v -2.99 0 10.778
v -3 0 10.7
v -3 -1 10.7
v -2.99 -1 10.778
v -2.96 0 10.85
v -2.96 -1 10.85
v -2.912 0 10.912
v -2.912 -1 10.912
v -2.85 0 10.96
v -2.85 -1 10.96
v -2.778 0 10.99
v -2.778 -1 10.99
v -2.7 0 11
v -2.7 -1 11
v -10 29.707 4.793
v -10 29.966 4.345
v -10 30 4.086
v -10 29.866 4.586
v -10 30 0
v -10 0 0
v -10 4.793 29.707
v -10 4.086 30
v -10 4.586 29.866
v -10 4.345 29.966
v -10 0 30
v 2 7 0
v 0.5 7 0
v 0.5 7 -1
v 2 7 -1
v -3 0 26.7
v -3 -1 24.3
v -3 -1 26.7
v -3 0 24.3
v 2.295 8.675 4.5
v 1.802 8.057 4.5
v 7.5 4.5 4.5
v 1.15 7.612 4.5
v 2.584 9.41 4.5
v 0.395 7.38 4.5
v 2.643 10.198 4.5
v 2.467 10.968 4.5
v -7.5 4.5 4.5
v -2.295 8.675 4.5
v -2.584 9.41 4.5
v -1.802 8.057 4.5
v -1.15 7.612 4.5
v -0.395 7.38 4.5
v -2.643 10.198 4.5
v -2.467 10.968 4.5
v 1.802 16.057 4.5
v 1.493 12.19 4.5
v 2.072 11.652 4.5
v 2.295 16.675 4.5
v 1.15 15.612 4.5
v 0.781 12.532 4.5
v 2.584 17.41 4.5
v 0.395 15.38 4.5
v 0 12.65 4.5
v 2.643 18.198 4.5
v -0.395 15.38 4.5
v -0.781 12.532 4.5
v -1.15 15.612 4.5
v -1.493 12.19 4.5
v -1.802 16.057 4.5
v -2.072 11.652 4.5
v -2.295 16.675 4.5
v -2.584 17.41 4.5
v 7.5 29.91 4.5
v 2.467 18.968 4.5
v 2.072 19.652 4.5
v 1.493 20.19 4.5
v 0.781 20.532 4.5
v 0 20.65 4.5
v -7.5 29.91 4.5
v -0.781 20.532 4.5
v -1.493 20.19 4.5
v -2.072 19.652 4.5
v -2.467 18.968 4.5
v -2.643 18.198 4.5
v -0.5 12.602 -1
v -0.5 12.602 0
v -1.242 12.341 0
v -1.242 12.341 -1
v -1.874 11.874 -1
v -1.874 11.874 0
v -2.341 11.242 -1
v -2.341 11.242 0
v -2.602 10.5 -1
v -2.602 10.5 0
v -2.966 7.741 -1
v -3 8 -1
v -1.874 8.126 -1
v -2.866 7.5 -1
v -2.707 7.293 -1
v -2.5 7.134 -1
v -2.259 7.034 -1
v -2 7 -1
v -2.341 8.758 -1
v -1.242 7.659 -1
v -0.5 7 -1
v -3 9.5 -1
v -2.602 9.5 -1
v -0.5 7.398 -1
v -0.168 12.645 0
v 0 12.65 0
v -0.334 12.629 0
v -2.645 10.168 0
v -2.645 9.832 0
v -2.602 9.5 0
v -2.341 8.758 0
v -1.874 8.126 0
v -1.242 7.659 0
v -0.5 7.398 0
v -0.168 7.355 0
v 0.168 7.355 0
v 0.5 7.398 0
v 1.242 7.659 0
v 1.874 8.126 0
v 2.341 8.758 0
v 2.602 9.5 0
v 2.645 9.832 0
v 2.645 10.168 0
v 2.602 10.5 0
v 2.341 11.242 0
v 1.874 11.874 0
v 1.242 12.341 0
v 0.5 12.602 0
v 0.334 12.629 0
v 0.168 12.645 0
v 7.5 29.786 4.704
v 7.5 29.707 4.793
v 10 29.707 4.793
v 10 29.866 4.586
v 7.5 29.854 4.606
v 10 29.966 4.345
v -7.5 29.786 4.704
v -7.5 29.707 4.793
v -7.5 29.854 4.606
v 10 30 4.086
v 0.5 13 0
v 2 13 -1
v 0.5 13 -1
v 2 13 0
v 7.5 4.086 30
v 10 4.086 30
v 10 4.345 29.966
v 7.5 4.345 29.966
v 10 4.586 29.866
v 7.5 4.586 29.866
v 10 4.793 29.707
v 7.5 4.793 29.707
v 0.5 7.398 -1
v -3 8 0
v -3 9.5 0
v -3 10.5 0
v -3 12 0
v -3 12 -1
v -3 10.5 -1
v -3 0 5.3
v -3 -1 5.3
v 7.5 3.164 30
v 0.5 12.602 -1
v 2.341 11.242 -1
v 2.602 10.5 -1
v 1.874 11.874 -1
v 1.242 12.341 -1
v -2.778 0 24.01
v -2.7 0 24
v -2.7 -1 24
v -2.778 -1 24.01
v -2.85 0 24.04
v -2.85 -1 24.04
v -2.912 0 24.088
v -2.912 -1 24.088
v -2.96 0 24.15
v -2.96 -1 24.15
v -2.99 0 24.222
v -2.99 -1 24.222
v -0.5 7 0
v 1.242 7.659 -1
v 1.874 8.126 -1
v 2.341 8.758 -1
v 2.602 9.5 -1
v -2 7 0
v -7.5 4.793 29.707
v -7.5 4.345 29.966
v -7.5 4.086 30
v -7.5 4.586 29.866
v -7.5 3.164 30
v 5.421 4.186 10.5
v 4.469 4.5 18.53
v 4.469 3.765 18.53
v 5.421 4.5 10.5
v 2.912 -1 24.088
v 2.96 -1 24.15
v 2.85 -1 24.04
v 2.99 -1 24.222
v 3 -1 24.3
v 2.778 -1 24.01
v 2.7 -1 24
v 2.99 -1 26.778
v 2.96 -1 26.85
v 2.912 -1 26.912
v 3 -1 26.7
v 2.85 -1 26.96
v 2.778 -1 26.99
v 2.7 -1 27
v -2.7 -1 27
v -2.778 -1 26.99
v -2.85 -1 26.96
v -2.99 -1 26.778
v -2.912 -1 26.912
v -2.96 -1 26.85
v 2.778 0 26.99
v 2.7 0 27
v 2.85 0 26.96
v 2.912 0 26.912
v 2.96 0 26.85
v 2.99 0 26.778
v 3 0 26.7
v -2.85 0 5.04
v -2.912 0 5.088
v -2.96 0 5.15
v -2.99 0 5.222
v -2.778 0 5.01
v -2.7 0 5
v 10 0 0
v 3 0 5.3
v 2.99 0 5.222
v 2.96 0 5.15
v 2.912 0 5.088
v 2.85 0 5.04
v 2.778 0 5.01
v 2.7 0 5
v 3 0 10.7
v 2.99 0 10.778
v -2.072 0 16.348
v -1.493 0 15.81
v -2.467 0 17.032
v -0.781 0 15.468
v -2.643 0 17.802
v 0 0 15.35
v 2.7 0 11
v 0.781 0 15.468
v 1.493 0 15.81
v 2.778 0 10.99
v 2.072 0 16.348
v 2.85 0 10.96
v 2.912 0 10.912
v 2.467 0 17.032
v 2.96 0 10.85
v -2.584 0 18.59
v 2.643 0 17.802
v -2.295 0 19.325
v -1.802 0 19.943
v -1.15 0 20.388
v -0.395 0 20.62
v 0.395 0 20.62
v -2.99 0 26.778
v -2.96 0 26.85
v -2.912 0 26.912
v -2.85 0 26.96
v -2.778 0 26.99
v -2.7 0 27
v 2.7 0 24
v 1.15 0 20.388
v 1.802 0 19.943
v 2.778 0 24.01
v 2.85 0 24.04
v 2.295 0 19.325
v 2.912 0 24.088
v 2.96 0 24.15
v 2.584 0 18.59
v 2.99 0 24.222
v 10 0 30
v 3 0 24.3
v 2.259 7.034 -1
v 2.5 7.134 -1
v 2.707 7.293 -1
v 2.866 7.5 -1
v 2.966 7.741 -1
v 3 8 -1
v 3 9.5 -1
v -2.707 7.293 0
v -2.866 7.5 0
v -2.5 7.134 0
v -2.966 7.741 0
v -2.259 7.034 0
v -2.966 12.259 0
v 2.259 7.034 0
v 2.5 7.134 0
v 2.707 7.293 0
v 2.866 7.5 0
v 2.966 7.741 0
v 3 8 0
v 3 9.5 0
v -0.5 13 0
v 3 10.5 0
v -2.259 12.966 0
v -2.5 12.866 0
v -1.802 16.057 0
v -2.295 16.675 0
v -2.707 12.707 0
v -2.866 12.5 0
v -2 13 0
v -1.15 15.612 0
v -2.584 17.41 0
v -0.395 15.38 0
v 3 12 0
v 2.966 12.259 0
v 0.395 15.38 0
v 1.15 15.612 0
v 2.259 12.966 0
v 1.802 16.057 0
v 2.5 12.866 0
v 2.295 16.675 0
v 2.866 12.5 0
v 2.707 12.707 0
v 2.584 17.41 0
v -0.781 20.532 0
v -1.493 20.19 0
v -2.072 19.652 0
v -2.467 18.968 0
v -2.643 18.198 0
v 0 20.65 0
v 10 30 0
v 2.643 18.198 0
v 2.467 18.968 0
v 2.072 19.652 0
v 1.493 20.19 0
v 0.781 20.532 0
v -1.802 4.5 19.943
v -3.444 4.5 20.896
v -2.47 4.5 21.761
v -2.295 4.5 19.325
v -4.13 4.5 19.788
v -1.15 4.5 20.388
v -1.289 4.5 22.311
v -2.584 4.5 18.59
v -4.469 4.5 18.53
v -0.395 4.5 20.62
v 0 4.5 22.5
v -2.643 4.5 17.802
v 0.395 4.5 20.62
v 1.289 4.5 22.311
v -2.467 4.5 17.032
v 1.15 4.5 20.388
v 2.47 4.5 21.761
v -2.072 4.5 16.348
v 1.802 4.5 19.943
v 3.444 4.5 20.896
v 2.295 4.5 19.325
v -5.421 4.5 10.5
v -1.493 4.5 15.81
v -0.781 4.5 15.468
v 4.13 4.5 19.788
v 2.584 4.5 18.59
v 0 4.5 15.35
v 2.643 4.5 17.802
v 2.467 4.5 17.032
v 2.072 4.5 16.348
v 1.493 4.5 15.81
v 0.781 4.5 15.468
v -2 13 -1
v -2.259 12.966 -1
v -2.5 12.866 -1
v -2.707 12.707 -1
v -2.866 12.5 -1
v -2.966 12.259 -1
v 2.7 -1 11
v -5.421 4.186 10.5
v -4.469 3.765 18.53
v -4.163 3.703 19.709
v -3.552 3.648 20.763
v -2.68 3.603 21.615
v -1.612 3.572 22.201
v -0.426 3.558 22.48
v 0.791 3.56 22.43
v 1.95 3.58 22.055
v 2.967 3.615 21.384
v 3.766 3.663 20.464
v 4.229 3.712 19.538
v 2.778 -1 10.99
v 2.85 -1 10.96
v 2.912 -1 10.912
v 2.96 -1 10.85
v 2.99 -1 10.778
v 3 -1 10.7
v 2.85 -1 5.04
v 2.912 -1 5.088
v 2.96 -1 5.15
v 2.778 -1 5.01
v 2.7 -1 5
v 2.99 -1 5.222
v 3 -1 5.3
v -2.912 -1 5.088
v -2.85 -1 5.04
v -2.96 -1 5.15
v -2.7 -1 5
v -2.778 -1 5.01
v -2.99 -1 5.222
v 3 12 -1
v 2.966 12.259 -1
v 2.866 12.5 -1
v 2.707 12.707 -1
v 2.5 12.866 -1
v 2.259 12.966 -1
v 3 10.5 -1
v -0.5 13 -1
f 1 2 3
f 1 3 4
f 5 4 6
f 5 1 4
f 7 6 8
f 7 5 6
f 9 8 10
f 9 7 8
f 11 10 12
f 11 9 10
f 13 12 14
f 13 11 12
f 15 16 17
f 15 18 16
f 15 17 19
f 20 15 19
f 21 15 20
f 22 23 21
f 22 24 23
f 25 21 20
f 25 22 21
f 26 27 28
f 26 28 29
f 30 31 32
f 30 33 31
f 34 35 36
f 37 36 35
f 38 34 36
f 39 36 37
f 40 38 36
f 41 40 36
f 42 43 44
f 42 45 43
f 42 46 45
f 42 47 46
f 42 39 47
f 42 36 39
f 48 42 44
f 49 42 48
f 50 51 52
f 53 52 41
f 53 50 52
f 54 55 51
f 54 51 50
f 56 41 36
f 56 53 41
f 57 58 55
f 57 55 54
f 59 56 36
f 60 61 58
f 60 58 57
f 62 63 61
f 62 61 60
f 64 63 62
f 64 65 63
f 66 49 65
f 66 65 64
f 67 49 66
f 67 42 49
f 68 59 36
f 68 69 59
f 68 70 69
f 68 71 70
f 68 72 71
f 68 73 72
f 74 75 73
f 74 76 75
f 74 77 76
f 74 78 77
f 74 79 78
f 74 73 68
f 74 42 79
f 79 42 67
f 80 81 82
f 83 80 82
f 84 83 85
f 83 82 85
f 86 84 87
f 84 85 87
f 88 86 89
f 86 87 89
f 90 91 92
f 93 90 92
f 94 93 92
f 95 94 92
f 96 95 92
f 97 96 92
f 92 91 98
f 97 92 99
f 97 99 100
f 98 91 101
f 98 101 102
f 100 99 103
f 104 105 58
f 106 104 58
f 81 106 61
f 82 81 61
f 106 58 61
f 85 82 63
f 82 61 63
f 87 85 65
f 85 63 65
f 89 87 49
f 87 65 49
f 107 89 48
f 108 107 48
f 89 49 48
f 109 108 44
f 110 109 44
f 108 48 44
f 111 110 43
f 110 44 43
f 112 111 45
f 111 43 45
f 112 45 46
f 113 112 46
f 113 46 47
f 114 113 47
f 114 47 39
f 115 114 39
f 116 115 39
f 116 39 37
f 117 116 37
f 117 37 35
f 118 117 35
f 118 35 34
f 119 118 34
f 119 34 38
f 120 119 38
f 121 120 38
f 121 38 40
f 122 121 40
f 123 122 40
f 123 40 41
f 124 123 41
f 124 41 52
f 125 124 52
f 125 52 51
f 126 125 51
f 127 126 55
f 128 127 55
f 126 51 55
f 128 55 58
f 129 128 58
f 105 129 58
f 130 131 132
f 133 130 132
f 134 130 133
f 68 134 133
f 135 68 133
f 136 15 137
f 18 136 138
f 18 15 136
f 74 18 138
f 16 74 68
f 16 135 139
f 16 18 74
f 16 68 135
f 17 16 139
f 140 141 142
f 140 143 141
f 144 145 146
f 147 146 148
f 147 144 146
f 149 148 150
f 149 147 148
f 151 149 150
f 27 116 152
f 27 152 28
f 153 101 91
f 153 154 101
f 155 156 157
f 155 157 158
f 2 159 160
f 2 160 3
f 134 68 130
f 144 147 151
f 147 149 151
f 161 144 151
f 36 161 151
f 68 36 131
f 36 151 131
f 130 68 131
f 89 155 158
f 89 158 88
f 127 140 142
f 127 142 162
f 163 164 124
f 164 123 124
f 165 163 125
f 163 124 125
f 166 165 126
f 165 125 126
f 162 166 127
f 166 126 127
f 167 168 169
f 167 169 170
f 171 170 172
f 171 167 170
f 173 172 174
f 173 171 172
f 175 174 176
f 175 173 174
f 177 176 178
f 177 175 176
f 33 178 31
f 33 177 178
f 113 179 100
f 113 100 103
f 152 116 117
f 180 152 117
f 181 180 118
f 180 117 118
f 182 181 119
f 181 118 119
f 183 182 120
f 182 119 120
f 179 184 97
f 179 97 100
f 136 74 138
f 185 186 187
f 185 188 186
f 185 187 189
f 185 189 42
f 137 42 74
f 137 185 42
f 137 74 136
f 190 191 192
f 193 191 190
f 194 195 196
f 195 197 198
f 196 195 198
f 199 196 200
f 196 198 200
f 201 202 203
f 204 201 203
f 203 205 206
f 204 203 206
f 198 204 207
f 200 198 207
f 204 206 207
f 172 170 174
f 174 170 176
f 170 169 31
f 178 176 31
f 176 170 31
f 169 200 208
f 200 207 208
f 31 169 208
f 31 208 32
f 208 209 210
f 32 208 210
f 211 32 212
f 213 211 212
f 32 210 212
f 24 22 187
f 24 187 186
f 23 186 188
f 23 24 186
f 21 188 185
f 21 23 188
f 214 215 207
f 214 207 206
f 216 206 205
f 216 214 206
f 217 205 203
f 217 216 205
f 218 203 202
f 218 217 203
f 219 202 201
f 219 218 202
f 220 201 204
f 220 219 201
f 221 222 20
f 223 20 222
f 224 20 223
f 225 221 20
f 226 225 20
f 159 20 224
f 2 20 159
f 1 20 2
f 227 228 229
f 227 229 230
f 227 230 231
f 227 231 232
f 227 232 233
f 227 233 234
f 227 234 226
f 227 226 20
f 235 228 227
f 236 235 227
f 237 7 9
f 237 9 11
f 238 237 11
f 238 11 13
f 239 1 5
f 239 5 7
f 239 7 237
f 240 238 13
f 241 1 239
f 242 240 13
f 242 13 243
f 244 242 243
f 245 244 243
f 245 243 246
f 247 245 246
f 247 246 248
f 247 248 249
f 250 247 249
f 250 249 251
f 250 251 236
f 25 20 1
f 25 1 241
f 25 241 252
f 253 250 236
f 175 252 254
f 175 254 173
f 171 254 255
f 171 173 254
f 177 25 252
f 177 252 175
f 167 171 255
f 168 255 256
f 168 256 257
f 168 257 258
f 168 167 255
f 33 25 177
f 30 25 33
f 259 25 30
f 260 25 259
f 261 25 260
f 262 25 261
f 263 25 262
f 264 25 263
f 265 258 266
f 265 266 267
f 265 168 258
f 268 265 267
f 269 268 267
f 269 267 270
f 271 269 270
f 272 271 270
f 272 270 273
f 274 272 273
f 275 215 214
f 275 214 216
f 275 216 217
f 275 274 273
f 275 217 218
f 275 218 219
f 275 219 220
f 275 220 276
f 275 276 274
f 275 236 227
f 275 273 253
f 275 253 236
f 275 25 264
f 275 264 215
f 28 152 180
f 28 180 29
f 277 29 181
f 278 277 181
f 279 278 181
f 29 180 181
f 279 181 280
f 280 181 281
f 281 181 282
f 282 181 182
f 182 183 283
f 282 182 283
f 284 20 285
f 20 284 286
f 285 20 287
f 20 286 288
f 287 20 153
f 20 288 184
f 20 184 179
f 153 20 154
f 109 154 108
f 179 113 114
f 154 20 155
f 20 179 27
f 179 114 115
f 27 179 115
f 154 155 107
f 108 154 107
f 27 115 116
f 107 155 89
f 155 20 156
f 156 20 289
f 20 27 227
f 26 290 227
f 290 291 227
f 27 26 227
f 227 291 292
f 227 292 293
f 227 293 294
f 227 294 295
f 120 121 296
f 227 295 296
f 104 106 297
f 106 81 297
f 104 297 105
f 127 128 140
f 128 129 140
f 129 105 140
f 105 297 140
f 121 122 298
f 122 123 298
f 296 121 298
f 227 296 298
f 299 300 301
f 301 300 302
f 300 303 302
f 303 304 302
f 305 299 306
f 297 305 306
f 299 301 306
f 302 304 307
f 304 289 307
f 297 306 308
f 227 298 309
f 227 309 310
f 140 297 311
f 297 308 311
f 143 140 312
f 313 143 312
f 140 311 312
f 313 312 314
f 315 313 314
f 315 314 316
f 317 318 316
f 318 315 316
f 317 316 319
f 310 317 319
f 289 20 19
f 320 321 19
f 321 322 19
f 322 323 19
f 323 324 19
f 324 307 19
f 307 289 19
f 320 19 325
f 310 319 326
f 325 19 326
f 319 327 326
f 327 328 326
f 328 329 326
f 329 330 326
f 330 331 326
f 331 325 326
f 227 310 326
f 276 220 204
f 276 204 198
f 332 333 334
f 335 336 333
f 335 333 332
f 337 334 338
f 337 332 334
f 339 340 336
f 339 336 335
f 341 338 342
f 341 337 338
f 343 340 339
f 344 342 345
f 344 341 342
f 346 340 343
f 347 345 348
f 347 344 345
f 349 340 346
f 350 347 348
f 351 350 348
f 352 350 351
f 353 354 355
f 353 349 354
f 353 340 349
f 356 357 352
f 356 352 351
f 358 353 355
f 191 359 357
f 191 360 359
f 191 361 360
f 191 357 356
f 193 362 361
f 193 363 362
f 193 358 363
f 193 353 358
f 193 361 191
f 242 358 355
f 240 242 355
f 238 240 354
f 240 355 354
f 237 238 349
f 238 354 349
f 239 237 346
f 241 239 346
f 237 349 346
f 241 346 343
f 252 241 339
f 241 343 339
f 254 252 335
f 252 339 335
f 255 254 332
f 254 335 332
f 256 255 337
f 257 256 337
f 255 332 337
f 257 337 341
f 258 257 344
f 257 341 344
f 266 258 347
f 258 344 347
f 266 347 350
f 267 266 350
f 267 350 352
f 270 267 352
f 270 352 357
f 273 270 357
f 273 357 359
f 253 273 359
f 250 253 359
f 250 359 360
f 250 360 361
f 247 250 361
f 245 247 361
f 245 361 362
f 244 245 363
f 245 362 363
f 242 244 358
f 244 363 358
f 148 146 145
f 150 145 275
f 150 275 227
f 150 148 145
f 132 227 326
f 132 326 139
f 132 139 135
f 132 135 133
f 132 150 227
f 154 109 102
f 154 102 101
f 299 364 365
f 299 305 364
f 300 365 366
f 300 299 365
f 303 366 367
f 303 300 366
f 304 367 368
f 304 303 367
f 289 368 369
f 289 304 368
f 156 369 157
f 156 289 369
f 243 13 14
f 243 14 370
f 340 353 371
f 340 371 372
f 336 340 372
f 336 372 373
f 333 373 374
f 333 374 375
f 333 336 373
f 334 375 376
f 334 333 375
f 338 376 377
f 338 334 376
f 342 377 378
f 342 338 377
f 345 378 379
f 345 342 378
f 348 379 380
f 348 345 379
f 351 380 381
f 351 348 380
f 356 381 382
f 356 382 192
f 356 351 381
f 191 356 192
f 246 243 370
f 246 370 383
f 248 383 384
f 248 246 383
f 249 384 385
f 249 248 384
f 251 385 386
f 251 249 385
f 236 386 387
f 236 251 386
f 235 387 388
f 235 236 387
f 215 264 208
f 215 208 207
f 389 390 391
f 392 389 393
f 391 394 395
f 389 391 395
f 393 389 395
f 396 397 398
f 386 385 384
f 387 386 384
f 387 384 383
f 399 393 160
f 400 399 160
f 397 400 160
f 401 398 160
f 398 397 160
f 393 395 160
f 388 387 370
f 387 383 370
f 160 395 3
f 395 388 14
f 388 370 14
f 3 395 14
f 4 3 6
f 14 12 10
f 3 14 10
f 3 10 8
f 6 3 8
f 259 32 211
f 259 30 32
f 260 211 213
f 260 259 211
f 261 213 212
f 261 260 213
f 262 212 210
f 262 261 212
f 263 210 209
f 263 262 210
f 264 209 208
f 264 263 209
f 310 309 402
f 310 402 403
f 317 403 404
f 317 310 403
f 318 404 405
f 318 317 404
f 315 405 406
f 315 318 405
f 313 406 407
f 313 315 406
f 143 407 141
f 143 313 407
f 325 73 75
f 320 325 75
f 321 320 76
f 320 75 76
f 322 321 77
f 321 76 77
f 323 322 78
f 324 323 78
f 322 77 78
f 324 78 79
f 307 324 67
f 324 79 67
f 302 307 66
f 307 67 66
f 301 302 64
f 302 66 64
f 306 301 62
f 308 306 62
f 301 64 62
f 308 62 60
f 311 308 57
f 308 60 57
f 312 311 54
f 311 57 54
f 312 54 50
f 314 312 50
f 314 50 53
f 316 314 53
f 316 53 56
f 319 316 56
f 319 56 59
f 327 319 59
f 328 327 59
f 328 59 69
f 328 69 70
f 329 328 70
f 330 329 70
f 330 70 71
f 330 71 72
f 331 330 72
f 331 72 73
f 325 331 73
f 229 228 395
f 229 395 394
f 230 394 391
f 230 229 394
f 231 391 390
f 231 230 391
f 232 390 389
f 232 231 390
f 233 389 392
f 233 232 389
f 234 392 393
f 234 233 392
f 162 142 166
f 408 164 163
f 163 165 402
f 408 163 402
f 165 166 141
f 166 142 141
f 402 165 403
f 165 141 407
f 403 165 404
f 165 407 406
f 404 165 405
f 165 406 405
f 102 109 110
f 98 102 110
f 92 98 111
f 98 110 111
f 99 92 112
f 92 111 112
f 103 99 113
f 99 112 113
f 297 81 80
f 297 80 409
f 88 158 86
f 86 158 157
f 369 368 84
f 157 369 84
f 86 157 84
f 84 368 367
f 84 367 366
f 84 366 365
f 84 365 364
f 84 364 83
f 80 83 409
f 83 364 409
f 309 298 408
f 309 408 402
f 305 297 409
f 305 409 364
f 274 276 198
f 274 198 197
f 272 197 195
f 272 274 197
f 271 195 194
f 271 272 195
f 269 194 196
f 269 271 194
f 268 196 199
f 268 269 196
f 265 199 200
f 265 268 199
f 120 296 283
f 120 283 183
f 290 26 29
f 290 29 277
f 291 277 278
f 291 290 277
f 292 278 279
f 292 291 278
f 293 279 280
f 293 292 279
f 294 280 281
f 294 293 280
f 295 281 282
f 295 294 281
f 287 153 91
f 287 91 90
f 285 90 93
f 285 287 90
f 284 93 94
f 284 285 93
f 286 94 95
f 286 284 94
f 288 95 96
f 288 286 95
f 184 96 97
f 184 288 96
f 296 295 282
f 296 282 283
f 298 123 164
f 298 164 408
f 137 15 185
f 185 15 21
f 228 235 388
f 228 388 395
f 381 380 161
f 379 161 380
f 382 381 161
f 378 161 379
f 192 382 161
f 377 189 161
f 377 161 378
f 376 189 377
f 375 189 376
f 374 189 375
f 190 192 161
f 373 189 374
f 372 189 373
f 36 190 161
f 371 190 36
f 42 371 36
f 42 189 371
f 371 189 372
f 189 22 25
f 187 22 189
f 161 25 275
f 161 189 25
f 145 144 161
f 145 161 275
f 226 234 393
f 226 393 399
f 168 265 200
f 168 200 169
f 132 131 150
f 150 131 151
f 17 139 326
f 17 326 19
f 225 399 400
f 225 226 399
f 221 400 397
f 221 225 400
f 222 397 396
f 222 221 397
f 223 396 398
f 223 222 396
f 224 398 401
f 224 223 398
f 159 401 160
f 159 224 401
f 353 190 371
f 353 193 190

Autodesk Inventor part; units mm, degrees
sketch "Sketch_15" plane through (0, 0, 0) normal (1, 0, 0) x (0, 1, 0)
  line L0 (0, 30) -> (0, 0)
  line L1 (0, 0) -> (30, 0)
  line L2 (30, 0) -> (30, 4.0858)
  arc A0 (30, 4.0858) -> (29.7071, 4.7929) centre (29, 4.0858) ccw
  line L3 (29.7071, 4.7929) -> (4.7929, 29.7071)
  arc A1 (4.7929, 29.7071) -> (4.0858, 30) centre (4.0858, 29) ccw
  line L4 (4.0858, 30) -> (0, 30)
extrude "Extrusion1" add sketch "Sketch_15" along normal mid plane 20
sketch "Sketch_16" plane through (0, 0, 0) normal (1, 0, 0) x (0, 1, 0)
  line L0 (2.9278, 34.5) -> (4.5, 4.5)
  line L1 (4.5, 4.5) -> (34.5, 4.5)
  line L2 (34.5, 4.5) -> (34.5, 34.5)
  line L3 (34.5, 34.5) -> (2.9278, 34.5)
extrude "Extrusion2" cut sketch "Sketch_16" along normal mid plane 15
sketch "Sketch_17" plane through (0, 4.5, 0) normal (0, 1, 0) x (1, 0, 0)
  line L0 (-5.4209, -10.5) -> (-4.4687, -18.5299)
  arc A0 (-4.4687, -18.5299) -> (4.4687, -18.5299) centre (0, -18) ccw
  line L1 (4.4687, -18.5299) -> (5.4209, -10.5)
  line L2 (5.4209, -10.5) -> (-5.4209, -10.5)
extrude "Extrusion3" add sketch "Sketch_17" against normal blind 2.25
sketch "Sketch4" plane through (10, 0, 0) normal (0, 0, -1) x (-1, 0, 0)
  point P0 (10, 18)
hole "Hole1" at (0, 18, 0) direction (0, 0, 1) diameter 5.3 depth 4.5
sketch "Sketch5" plane through (10, 0, 0) normal (0, 0, -1) x (-1, 0, 0)
  point P0 (10, 10)
hole "Hole2" at (0, 10, 0) direction (0, 0, 1) diameter 5.3 depth 4.5
sketch "Sketch6" plane through (-10, 0, 30) normal (0, -1, 0) x (1, 0, 0)
  point P0 (10, -12)
hole "Hole3" at (0, 0, 18) direction (0, 1, 0) diameter 5.3 depth 4.5
sketch "Sketch_1" plane through (0, 0, 0) normal (0, 1, 0) x (-1, 0, 0)
  line L0 (10, 0) -> (10, 30)
  line L1 (10, 30) -> (-10, 30)
  line L2 (-10, 30) -> (-10, 0)
  line L3 (-10, 0) -> (10, 0)
extrude "Extrusion4" add sketch "Sketch_1" against normal blind 1
sketch "Sketch_4" plane through (0, 0, 0) normal (0, 1, 0) x (-1, 0, 0)
  line L0 (10, 0) -> (10, 30)
  line L1 (10, 30) -> (-10, 30)
  line L2 (-10, 30) -> (-10, 0)
  line L3 (-10, 0) -> (10, 0)
  arc A0 (3, 10.7) -> (2.7, 11) centre (2.7, 10.7) ccw
  line L4 (2.7, 11) -> (-2.7, 11)
  arc A1 (-2.7, 11) -> (-3, 10.7) centre (-2.7, 10.7) ccw
  line L5 (-3, 10.7) -> (-3, 5.3)
  arc A2 (-3, 5.3) -> (-2.7, 5) centre (-2.7, 5.3) ccw
  line L6 (-2.7, 5) -> (2.7, 5)
  arc A3 (2.7, 5) -> (3, 5.3) centre (2.7, 5.3) ccw
  line L7 (3, 5.3) -> (3, 10.7)
  arc A4 (3, 26.7) -> (2.7, 27) centre (2.7, 26.7) ccw
  line L8 (2.7, 27) -> (-2.7, 27)
  arc A5 (-2.7, 27) -> (-3, 26.7) centre (-2.7, 26.7) ccw
  line L9 (-3, 26.7) -> (-3, 24.3)
  arc A6 (-3, 24.3) -> (-2.7, 24) centre (-2.7, 24.3) ccw
  line L10 (-2.7, 24) -> (2.7, 24)
  arc A7 (2.7, 24) -> (3, 24.3) centre (2.7, 24.3) ccw
  line L11 (3, 24.3) -> (3, 26.7)
extrude "Extrusion5" cut sketch "Sketch_4" against normal blind 1
sketch "Sketch_10" plane through (0, 0, 0) normal (0, 0, 1) x (1, 0, 0)
  line L0 (-10, 0) -> (10, 0)
  line L1 (10, 0) -> (10, 30)
  line L2 (10, 30) -> (-10, 30)
  line L3 (-10, 30) -> (-10, 0)
extrude "Extrusion6" add sketch "Sketch_10" against normal blind 1
sketch "Sketch_11" plane through (0, 0, 0) normal (0, 0, 1) x (1, 0, 0)
  line L0 (-10, 0) -> (10, 0)
  line L1 (10, 0) -> (10, 30)
  line L2 (10, 30) -> (-10, 30)
  line L3 (-10, 30) -> (-10, 0)
  line L4 (0.5, 7) -> (2, 7)
  arc A0 (2, 7) -> (3, 8) centre (2, 8) ccw
  line L5 (3, 8) -> (3, 9.5)
  line L6 (3, 9.5) -> (2.6024, 9.5)
  arc A1 (0.5, 7.3976) -> (2.6024, 9.5) centre (0, 10) ccw
  line L7 (0.5, 7.3976) -> (0.5, 7)
  line L8 (0.5, 13) -> (0.5, 12.6024)
  arc A2 (2.6024, 10.5) -> (0.5, 12.6024) centre (0, 10) ccw
  line L9 (2.6024, 10.5) -> (3, 10.5)
  line L10 (3, 10.5) -> (3, 12)
  arc A3 (3, 12) -> (2, 13) centre (2, 12) ccw
  line L11 (2, 13) -> (0.5, 13)
  line L12 (-3, 9.5) -> (-3, 8)
  arc A4 (-3, 8) -> (-2, 7) centre (-2, 8) ccw
  line L13 (-2, 7) -> (-0.5, 7)
  line L14 (-0.5, 7) -> (-0.5, 7.3976)
  arc A5 (-2.6024, 9.5) -> (-0.5, 7.3976) centre (0, 10) ccw
  line L15 (-2.6024, 9.5) -> (-3, 9.5)
  line L16 (-3, 10.5) -> (-2.6024, 10.5)
  arc A6 (-0.5, 12.6024) -> (-2.6024, 10.5) centre (0, 10) ccw
  line L17 (-0.5, 12.6024) -> (-0.5, 13)
  line L18 (-0.5, 13) -> (-2, 13)
  arc A7 (-2, 13) -> (-3, 12) centre (-2, 12) ccw
  line L19 (-3, 12) -> (-3, 10.5)
extrude "Extrusion7" cut sketch "Sketch_11" against normal blind 1
ref_plane "bracket_to_bolt_XY" through (1, 10, 0) normal (0, 0, 1) x (1, 0, 0)
ref_plane "bracket_to_bolt_YZ" through (1, 10, 0) normal (1, 0, 0) x (0, 1, 0)
ref_plane "bracket_to_bolt_ZX" through (1, 10, 0) normal (0, 1, 0) x (0, 0, 1)
ref_plane "bracket_to_dummy_XY" through (0, 0, 0) normal (0, 1, 0) x (1, 0, 0)
ref_plane "bracket_to_dummy_YZ" through (0, 0, 0) normal (1, 0, 0) x (0, 0, -1)
ref_plane "bracket_to_dummy_ZX" through (0, 0, 0) normal (0, 0, -1) x (0, 1, 0)
ref_plane "to_bolt_4_7_base_XY" through (0, 4.5, 18) normal (0, 1, 0) x (1, 0, 0)
ref_plane "to_bolt_4_7_base_YZ" through (0, 4.5, 18) normal (1, 0, 0) x (0, 0, -1)
ref_plane "to_bolt_4_7_base_ZX" through (0, 4.5, 18) normal (0, 0, -1) x (0, 1, 0)
ref_plane "to_bolt_row_4_to_7_XY" through (0, 18, 4.5) normal (0, 0, 1) x (1, 0, 0)
ref_plane "to_bolt_row_4_to_7_YZ" through (0, 18, 4.5) normal (1, 0, 0) x (0, 1, 0)
ref_plane "to_bolt_row_4_to_7_ZX" through (0, 18, 4.5) normal (0, 1, 0) x (0, 0, 1)
ref_plane "to_nut_base_4_7_XY" through (0, -2, 18) normal (0, 1, 0) x (1, 0, 0)
ref_plane "to_nut_base_4_7_YZ" through (0, -2, 18) normal (1, 0, 0) x (0, 0, -1)
ref_plane "to_nut_base_4_7_ZX" through (0, -2, 18) normal (0, 0, -1) x (0, 1, 0)
ref_plane "to_nut_row_4_to_7_XY" through (0, 18, -2) normal (0, 0, 1) x (1, 0, 0)
ref_plane "to_nut_row_4_to_7_YZ" through (0, 18, -2) normal (1, 0, 0) x (0, 1, 0)
ref_plane "to_nut_row_4_to_7_ZX" through (0, 18, -2) normal (0, 1, 0) x (0, 0, 1)
properties part number "HBLFSN5"
